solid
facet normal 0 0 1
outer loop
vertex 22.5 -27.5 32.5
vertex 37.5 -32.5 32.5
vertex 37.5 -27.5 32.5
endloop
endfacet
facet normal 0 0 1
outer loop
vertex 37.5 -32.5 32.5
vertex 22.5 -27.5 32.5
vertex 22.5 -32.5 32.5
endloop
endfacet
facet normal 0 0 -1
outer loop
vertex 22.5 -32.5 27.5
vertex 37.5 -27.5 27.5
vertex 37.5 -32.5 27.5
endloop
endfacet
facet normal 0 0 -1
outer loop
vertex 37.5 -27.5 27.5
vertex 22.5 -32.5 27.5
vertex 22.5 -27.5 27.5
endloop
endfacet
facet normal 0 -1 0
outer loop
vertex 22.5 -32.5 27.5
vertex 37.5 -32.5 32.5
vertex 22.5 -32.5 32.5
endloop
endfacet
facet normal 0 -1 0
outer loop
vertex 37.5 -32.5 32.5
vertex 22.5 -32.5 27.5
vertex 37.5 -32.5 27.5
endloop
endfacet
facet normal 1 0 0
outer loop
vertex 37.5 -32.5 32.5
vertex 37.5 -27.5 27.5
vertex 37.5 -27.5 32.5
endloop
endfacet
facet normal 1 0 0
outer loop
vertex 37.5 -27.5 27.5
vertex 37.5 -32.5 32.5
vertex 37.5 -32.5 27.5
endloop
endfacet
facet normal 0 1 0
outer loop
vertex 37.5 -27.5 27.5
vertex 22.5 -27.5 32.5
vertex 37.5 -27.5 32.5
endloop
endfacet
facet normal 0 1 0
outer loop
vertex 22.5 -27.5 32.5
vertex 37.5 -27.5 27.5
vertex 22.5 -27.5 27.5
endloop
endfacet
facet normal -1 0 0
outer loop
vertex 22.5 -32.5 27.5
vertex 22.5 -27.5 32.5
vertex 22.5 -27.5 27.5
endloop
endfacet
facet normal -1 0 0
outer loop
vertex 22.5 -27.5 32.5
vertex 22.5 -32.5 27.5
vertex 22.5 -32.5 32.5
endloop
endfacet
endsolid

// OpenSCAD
// Generated by generate_scads.py
translate([30,-30,30]) {
  cube(size=[15,5,5], center=true);
}
